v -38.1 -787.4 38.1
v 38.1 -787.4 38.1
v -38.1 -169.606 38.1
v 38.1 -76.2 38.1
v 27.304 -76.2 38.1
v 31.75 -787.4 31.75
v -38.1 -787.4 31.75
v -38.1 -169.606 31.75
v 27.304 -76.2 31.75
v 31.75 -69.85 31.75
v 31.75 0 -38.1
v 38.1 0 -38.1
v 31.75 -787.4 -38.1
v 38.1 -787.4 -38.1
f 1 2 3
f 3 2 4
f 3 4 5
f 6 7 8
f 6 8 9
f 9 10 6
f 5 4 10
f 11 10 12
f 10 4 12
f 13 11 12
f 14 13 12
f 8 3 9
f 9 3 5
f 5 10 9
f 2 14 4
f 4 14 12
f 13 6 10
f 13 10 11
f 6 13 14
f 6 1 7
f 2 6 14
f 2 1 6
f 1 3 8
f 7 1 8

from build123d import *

# Parameters (mm, degrees)
F1_DEPTH = 787.4
F3_DEPTH = 76.2
F5_DEPTH = 25.4
F7_DEPTH = 25.4


with BuildPart() as f1:
    # F0 (on Front) → F1 (new body)
    with BuildSketch(Plane.XZ):
        Polygon((31.75, -38.1), (38.1, -38.1), (38.1, 38.1), (-38.1, 38.1), (-38.1, 31.75), (31.75, 31.75), align=None)
    extrude(amount=F1_DEPTH)

    # F2 (on face) → F3 (cut)
    with BuildSketch(Plane.YZ.offset(38.1)):
        Polygon((-76.2, 38.1), (0, -38.1), (0, 38.1), align=None)
    extrude(amount=-F3_DEPTH, mode=Mode.SUBTRACT)

    # F4 (on face) → F5 (cut)
    with BuildSketch(Plane.XY.offset(38.1)):
        Polygon((-38.1, -169.606138), (27.303682, -76.2), (-38.1, -76.2), align=None)
    extrude(amount=-F5_DEPTH, mode=Mode.SUBTRACT)

    # F6 (on face) → F7 (cut)
    with BuildSketch(Plane(origin=(0, 0, 31.75), x_dir=(1, 0, 0), z_dir=(0, 0, -1))):
        Polygon((-38.1, 69.85), (31.75, 69.85), (27.303682, 76.2), (-38.1, 76.2), align=None)
    extrude(amount=-F7_DEPTH, mode=Mode.SUBTRACT)


solid = f1.part
